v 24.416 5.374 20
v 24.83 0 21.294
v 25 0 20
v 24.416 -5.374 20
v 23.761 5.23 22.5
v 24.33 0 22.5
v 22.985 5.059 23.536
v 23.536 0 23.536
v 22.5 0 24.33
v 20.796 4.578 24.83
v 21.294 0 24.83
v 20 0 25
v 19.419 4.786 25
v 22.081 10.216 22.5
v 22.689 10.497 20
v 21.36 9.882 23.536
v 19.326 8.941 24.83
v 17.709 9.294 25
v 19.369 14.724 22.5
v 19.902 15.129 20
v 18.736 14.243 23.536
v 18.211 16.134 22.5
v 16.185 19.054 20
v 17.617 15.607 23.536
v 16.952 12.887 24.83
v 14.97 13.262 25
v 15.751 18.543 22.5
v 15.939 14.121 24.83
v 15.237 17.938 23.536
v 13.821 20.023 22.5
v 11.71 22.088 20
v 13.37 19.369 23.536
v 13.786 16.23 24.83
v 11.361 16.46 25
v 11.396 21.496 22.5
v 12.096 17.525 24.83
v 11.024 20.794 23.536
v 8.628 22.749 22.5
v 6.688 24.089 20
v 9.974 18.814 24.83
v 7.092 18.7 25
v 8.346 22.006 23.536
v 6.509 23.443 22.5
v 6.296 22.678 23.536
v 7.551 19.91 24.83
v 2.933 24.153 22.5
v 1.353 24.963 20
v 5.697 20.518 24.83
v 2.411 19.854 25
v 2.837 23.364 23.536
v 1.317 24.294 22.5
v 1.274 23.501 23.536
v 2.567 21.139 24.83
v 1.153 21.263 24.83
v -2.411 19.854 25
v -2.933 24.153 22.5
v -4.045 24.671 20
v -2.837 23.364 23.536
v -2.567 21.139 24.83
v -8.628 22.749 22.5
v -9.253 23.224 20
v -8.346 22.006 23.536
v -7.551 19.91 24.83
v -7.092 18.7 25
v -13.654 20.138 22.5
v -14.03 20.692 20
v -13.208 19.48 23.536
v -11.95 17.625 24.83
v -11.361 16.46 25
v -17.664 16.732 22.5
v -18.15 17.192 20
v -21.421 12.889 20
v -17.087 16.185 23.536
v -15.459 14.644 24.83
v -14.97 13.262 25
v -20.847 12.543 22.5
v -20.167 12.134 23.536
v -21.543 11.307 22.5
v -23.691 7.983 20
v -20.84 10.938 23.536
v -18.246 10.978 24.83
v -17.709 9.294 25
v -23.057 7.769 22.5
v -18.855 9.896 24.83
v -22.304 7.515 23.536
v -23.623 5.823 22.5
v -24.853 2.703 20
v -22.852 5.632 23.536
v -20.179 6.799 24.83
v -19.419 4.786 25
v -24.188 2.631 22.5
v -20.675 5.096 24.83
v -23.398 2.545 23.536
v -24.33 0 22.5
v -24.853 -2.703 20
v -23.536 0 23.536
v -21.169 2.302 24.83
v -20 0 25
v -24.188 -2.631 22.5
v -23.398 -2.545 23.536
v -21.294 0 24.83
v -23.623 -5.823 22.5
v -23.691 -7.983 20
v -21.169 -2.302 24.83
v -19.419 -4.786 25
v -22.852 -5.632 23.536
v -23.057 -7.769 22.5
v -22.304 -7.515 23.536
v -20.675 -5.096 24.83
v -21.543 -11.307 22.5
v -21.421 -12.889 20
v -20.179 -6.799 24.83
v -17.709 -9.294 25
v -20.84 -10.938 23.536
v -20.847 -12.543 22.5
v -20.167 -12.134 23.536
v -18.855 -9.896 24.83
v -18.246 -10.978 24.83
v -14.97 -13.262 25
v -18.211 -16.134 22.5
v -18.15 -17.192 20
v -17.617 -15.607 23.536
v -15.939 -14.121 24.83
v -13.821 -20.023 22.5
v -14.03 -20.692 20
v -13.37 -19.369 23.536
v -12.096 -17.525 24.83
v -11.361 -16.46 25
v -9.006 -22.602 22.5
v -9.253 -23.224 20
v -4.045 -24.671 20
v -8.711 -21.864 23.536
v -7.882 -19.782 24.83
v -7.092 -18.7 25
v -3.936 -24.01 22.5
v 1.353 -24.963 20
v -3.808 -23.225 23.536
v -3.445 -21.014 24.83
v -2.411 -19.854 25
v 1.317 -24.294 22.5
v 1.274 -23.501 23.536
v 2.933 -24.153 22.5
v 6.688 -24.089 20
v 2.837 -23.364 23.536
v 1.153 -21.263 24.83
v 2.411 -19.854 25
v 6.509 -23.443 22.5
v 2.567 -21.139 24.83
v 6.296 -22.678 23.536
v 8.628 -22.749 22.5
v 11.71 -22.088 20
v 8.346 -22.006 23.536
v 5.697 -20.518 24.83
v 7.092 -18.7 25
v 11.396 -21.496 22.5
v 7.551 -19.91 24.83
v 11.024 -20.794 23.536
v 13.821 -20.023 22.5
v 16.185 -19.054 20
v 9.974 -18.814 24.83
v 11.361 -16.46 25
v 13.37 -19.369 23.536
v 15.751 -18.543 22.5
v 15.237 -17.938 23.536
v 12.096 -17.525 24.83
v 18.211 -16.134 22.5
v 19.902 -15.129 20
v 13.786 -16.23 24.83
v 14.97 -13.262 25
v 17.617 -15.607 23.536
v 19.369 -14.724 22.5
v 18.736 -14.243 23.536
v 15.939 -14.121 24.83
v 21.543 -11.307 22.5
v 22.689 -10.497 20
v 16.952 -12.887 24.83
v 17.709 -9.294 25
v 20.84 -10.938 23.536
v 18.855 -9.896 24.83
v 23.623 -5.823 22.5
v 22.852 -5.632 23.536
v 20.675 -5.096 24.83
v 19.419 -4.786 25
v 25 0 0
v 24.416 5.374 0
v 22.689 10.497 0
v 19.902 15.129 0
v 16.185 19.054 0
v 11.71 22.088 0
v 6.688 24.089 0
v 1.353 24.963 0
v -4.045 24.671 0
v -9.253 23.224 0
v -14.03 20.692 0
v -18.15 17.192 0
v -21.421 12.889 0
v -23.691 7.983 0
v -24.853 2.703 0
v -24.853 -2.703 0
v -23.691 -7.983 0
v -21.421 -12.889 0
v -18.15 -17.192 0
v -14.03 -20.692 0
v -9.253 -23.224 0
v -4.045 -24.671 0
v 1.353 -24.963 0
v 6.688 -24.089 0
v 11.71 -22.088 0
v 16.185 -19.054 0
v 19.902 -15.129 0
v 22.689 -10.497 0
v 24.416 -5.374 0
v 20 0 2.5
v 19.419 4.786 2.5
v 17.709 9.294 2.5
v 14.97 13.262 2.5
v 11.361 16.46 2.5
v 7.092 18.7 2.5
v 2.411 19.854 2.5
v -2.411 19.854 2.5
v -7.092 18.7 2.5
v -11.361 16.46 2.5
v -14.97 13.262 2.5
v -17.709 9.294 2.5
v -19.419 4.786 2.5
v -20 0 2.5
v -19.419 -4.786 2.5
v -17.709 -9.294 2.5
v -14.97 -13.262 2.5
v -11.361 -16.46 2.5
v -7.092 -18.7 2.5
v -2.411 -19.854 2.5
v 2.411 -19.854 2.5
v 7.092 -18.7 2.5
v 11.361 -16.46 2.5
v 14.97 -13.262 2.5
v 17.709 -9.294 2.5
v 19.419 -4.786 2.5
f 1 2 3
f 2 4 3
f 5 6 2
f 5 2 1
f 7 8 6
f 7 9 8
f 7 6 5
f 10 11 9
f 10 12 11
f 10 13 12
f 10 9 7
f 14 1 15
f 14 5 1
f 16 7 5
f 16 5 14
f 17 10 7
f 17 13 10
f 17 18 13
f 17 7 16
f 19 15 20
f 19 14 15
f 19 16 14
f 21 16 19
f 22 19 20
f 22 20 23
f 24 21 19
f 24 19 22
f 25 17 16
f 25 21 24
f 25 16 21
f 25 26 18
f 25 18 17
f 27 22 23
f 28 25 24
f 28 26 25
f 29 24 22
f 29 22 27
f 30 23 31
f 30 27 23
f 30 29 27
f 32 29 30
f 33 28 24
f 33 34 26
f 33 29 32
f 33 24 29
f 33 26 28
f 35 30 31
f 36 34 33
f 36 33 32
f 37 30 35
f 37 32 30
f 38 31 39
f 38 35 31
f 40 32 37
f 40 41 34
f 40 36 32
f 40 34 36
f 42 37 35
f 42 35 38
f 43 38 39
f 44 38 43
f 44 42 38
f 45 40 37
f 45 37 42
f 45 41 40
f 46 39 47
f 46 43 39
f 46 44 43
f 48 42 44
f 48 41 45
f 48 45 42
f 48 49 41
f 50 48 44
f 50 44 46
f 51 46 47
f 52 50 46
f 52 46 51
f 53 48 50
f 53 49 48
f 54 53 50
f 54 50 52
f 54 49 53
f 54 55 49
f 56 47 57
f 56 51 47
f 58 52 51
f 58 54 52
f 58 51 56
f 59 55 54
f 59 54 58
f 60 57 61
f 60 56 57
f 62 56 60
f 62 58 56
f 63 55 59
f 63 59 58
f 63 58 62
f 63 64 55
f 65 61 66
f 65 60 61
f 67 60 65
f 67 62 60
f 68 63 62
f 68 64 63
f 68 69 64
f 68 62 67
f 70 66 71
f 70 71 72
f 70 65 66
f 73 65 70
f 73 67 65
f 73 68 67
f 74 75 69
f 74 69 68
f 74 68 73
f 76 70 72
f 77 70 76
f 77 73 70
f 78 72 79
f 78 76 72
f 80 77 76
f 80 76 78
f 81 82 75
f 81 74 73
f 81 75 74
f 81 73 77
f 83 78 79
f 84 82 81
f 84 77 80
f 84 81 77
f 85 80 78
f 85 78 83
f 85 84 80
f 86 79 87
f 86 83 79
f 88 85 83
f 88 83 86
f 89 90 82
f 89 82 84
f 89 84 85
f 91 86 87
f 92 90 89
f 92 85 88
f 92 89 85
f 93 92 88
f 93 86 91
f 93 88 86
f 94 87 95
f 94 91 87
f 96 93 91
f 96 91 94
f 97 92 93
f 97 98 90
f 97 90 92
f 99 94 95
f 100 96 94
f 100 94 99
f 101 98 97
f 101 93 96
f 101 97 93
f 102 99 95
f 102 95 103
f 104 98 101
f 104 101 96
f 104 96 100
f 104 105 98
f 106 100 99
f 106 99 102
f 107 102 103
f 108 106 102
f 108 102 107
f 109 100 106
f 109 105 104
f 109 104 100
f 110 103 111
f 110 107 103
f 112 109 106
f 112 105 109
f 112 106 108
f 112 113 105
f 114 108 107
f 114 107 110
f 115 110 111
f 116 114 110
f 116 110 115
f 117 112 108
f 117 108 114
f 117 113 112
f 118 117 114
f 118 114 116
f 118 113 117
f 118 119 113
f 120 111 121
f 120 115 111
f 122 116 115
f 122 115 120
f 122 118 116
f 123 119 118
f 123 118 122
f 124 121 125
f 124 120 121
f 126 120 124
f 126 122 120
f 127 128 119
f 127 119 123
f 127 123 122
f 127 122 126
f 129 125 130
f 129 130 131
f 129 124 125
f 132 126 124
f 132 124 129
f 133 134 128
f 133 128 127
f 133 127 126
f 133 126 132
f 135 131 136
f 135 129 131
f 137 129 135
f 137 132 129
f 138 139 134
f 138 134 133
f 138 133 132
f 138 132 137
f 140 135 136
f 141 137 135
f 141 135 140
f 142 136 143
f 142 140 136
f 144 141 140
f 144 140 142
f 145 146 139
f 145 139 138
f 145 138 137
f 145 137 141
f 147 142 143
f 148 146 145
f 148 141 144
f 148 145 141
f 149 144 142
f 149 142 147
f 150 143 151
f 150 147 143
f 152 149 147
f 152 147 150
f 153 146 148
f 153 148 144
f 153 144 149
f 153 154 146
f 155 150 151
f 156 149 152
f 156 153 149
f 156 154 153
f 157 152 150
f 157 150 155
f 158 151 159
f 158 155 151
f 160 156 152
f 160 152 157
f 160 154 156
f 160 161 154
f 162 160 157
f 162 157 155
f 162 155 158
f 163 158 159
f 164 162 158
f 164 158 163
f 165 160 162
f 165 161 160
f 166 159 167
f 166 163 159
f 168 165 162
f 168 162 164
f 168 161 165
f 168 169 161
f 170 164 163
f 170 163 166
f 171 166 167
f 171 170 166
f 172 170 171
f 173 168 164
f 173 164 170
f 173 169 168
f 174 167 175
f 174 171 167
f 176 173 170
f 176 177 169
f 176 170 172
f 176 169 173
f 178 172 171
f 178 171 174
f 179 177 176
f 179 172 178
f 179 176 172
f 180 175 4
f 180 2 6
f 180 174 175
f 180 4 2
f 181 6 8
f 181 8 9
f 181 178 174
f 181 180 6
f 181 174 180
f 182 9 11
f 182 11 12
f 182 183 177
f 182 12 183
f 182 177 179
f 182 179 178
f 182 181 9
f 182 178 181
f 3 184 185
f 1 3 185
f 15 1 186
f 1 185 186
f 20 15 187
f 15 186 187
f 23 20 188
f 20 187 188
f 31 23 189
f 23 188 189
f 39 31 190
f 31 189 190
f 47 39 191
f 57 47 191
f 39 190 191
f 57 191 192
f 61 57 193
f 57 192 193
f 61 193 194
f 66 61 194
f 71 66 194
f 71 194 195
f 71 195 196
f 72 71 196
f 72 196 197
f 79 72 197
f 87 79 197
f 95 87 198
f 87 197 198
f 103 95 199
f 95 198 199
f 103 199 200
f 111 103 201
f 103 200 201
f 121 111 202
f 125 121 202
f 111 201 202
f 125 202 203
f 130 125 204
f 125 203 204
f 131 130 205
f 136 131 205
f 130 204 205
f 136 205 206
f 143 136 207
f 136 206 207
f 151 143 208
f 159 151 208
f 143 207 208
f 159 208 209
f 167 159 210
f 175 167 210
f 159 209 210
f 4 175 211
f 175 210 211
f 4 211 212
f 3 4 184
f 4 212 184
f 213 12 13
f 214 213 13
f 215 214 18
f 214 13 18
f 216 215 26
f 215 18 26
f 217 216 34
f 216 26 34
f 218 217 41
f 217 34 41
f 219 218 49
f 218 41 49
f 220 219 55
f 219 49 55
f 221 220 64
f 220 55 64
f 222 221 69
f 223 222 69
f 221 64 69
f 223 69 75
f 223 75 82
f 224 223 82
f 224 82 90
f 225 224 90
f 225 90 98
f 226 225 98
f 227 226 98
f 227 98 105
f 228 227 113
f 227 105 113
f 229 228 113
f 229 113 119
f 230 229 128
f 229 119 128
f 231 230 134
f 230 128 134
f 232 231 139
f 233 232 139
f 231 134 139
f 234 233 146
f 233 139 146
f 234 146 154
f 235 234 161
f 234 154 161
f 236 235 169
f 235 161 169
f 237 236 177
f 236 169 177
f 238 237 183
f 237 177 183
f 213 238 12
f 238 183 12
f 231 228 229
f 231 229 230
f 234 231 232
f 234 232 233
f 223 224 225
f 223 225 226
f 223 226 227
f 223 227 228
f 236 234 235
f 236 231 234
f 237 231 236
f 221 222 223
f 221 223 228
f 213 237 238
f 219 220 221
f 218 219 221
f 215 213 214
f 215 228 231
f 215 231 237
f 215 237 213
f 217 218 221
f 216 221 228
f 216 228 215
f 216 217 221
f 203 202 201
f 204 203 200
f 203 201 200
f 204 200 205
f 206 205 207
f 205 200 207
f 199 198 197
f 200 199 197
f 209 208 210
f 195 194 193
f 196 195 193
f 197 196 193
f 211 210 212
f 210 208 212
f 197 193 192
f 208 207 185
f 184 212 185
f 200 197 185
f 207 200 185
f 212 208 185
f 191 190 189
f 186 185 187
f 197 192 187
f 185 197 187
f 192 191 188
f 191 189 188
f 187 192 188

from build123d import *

# Parameters (mm, degrees)
F0_R      = 25
F1_DEPTH  = 25
F2_R      = 5
F1_FACE_R = 20
F3_DEPTH  = 20
F4_R      = 20
F5_DEPTH  = 22.5


with BuildPart() as f1:
    # F0 (on Top) → F1 (new body)
    with BuildSketch(Plane.XY):
        Circle(F0_R)
    extrude(amount=F1_DEPTH)

    # F2
    f2_edges = [f1.edges().sort_by_distance(p)[0] for p in [
        (-25, 0, 25),
    ]]
    fillet(f2_edges, radius=F2_R)

    # F1_face (on face) → F3 (join)
    with BuildSketch(Plane.XY.offset(25)):
        Circle(F1_FACE_R)
    extrude(amount=-F3_DEPTH)

    # F4 (on face) → F5 (cut)
    with BuildSketch(Plane.XY.offset(25)):
        Circle(F4_R)
    extrude(amount=-F5_DEPTH, mode=Mode.SUBTRACT)


solid = f1.part
